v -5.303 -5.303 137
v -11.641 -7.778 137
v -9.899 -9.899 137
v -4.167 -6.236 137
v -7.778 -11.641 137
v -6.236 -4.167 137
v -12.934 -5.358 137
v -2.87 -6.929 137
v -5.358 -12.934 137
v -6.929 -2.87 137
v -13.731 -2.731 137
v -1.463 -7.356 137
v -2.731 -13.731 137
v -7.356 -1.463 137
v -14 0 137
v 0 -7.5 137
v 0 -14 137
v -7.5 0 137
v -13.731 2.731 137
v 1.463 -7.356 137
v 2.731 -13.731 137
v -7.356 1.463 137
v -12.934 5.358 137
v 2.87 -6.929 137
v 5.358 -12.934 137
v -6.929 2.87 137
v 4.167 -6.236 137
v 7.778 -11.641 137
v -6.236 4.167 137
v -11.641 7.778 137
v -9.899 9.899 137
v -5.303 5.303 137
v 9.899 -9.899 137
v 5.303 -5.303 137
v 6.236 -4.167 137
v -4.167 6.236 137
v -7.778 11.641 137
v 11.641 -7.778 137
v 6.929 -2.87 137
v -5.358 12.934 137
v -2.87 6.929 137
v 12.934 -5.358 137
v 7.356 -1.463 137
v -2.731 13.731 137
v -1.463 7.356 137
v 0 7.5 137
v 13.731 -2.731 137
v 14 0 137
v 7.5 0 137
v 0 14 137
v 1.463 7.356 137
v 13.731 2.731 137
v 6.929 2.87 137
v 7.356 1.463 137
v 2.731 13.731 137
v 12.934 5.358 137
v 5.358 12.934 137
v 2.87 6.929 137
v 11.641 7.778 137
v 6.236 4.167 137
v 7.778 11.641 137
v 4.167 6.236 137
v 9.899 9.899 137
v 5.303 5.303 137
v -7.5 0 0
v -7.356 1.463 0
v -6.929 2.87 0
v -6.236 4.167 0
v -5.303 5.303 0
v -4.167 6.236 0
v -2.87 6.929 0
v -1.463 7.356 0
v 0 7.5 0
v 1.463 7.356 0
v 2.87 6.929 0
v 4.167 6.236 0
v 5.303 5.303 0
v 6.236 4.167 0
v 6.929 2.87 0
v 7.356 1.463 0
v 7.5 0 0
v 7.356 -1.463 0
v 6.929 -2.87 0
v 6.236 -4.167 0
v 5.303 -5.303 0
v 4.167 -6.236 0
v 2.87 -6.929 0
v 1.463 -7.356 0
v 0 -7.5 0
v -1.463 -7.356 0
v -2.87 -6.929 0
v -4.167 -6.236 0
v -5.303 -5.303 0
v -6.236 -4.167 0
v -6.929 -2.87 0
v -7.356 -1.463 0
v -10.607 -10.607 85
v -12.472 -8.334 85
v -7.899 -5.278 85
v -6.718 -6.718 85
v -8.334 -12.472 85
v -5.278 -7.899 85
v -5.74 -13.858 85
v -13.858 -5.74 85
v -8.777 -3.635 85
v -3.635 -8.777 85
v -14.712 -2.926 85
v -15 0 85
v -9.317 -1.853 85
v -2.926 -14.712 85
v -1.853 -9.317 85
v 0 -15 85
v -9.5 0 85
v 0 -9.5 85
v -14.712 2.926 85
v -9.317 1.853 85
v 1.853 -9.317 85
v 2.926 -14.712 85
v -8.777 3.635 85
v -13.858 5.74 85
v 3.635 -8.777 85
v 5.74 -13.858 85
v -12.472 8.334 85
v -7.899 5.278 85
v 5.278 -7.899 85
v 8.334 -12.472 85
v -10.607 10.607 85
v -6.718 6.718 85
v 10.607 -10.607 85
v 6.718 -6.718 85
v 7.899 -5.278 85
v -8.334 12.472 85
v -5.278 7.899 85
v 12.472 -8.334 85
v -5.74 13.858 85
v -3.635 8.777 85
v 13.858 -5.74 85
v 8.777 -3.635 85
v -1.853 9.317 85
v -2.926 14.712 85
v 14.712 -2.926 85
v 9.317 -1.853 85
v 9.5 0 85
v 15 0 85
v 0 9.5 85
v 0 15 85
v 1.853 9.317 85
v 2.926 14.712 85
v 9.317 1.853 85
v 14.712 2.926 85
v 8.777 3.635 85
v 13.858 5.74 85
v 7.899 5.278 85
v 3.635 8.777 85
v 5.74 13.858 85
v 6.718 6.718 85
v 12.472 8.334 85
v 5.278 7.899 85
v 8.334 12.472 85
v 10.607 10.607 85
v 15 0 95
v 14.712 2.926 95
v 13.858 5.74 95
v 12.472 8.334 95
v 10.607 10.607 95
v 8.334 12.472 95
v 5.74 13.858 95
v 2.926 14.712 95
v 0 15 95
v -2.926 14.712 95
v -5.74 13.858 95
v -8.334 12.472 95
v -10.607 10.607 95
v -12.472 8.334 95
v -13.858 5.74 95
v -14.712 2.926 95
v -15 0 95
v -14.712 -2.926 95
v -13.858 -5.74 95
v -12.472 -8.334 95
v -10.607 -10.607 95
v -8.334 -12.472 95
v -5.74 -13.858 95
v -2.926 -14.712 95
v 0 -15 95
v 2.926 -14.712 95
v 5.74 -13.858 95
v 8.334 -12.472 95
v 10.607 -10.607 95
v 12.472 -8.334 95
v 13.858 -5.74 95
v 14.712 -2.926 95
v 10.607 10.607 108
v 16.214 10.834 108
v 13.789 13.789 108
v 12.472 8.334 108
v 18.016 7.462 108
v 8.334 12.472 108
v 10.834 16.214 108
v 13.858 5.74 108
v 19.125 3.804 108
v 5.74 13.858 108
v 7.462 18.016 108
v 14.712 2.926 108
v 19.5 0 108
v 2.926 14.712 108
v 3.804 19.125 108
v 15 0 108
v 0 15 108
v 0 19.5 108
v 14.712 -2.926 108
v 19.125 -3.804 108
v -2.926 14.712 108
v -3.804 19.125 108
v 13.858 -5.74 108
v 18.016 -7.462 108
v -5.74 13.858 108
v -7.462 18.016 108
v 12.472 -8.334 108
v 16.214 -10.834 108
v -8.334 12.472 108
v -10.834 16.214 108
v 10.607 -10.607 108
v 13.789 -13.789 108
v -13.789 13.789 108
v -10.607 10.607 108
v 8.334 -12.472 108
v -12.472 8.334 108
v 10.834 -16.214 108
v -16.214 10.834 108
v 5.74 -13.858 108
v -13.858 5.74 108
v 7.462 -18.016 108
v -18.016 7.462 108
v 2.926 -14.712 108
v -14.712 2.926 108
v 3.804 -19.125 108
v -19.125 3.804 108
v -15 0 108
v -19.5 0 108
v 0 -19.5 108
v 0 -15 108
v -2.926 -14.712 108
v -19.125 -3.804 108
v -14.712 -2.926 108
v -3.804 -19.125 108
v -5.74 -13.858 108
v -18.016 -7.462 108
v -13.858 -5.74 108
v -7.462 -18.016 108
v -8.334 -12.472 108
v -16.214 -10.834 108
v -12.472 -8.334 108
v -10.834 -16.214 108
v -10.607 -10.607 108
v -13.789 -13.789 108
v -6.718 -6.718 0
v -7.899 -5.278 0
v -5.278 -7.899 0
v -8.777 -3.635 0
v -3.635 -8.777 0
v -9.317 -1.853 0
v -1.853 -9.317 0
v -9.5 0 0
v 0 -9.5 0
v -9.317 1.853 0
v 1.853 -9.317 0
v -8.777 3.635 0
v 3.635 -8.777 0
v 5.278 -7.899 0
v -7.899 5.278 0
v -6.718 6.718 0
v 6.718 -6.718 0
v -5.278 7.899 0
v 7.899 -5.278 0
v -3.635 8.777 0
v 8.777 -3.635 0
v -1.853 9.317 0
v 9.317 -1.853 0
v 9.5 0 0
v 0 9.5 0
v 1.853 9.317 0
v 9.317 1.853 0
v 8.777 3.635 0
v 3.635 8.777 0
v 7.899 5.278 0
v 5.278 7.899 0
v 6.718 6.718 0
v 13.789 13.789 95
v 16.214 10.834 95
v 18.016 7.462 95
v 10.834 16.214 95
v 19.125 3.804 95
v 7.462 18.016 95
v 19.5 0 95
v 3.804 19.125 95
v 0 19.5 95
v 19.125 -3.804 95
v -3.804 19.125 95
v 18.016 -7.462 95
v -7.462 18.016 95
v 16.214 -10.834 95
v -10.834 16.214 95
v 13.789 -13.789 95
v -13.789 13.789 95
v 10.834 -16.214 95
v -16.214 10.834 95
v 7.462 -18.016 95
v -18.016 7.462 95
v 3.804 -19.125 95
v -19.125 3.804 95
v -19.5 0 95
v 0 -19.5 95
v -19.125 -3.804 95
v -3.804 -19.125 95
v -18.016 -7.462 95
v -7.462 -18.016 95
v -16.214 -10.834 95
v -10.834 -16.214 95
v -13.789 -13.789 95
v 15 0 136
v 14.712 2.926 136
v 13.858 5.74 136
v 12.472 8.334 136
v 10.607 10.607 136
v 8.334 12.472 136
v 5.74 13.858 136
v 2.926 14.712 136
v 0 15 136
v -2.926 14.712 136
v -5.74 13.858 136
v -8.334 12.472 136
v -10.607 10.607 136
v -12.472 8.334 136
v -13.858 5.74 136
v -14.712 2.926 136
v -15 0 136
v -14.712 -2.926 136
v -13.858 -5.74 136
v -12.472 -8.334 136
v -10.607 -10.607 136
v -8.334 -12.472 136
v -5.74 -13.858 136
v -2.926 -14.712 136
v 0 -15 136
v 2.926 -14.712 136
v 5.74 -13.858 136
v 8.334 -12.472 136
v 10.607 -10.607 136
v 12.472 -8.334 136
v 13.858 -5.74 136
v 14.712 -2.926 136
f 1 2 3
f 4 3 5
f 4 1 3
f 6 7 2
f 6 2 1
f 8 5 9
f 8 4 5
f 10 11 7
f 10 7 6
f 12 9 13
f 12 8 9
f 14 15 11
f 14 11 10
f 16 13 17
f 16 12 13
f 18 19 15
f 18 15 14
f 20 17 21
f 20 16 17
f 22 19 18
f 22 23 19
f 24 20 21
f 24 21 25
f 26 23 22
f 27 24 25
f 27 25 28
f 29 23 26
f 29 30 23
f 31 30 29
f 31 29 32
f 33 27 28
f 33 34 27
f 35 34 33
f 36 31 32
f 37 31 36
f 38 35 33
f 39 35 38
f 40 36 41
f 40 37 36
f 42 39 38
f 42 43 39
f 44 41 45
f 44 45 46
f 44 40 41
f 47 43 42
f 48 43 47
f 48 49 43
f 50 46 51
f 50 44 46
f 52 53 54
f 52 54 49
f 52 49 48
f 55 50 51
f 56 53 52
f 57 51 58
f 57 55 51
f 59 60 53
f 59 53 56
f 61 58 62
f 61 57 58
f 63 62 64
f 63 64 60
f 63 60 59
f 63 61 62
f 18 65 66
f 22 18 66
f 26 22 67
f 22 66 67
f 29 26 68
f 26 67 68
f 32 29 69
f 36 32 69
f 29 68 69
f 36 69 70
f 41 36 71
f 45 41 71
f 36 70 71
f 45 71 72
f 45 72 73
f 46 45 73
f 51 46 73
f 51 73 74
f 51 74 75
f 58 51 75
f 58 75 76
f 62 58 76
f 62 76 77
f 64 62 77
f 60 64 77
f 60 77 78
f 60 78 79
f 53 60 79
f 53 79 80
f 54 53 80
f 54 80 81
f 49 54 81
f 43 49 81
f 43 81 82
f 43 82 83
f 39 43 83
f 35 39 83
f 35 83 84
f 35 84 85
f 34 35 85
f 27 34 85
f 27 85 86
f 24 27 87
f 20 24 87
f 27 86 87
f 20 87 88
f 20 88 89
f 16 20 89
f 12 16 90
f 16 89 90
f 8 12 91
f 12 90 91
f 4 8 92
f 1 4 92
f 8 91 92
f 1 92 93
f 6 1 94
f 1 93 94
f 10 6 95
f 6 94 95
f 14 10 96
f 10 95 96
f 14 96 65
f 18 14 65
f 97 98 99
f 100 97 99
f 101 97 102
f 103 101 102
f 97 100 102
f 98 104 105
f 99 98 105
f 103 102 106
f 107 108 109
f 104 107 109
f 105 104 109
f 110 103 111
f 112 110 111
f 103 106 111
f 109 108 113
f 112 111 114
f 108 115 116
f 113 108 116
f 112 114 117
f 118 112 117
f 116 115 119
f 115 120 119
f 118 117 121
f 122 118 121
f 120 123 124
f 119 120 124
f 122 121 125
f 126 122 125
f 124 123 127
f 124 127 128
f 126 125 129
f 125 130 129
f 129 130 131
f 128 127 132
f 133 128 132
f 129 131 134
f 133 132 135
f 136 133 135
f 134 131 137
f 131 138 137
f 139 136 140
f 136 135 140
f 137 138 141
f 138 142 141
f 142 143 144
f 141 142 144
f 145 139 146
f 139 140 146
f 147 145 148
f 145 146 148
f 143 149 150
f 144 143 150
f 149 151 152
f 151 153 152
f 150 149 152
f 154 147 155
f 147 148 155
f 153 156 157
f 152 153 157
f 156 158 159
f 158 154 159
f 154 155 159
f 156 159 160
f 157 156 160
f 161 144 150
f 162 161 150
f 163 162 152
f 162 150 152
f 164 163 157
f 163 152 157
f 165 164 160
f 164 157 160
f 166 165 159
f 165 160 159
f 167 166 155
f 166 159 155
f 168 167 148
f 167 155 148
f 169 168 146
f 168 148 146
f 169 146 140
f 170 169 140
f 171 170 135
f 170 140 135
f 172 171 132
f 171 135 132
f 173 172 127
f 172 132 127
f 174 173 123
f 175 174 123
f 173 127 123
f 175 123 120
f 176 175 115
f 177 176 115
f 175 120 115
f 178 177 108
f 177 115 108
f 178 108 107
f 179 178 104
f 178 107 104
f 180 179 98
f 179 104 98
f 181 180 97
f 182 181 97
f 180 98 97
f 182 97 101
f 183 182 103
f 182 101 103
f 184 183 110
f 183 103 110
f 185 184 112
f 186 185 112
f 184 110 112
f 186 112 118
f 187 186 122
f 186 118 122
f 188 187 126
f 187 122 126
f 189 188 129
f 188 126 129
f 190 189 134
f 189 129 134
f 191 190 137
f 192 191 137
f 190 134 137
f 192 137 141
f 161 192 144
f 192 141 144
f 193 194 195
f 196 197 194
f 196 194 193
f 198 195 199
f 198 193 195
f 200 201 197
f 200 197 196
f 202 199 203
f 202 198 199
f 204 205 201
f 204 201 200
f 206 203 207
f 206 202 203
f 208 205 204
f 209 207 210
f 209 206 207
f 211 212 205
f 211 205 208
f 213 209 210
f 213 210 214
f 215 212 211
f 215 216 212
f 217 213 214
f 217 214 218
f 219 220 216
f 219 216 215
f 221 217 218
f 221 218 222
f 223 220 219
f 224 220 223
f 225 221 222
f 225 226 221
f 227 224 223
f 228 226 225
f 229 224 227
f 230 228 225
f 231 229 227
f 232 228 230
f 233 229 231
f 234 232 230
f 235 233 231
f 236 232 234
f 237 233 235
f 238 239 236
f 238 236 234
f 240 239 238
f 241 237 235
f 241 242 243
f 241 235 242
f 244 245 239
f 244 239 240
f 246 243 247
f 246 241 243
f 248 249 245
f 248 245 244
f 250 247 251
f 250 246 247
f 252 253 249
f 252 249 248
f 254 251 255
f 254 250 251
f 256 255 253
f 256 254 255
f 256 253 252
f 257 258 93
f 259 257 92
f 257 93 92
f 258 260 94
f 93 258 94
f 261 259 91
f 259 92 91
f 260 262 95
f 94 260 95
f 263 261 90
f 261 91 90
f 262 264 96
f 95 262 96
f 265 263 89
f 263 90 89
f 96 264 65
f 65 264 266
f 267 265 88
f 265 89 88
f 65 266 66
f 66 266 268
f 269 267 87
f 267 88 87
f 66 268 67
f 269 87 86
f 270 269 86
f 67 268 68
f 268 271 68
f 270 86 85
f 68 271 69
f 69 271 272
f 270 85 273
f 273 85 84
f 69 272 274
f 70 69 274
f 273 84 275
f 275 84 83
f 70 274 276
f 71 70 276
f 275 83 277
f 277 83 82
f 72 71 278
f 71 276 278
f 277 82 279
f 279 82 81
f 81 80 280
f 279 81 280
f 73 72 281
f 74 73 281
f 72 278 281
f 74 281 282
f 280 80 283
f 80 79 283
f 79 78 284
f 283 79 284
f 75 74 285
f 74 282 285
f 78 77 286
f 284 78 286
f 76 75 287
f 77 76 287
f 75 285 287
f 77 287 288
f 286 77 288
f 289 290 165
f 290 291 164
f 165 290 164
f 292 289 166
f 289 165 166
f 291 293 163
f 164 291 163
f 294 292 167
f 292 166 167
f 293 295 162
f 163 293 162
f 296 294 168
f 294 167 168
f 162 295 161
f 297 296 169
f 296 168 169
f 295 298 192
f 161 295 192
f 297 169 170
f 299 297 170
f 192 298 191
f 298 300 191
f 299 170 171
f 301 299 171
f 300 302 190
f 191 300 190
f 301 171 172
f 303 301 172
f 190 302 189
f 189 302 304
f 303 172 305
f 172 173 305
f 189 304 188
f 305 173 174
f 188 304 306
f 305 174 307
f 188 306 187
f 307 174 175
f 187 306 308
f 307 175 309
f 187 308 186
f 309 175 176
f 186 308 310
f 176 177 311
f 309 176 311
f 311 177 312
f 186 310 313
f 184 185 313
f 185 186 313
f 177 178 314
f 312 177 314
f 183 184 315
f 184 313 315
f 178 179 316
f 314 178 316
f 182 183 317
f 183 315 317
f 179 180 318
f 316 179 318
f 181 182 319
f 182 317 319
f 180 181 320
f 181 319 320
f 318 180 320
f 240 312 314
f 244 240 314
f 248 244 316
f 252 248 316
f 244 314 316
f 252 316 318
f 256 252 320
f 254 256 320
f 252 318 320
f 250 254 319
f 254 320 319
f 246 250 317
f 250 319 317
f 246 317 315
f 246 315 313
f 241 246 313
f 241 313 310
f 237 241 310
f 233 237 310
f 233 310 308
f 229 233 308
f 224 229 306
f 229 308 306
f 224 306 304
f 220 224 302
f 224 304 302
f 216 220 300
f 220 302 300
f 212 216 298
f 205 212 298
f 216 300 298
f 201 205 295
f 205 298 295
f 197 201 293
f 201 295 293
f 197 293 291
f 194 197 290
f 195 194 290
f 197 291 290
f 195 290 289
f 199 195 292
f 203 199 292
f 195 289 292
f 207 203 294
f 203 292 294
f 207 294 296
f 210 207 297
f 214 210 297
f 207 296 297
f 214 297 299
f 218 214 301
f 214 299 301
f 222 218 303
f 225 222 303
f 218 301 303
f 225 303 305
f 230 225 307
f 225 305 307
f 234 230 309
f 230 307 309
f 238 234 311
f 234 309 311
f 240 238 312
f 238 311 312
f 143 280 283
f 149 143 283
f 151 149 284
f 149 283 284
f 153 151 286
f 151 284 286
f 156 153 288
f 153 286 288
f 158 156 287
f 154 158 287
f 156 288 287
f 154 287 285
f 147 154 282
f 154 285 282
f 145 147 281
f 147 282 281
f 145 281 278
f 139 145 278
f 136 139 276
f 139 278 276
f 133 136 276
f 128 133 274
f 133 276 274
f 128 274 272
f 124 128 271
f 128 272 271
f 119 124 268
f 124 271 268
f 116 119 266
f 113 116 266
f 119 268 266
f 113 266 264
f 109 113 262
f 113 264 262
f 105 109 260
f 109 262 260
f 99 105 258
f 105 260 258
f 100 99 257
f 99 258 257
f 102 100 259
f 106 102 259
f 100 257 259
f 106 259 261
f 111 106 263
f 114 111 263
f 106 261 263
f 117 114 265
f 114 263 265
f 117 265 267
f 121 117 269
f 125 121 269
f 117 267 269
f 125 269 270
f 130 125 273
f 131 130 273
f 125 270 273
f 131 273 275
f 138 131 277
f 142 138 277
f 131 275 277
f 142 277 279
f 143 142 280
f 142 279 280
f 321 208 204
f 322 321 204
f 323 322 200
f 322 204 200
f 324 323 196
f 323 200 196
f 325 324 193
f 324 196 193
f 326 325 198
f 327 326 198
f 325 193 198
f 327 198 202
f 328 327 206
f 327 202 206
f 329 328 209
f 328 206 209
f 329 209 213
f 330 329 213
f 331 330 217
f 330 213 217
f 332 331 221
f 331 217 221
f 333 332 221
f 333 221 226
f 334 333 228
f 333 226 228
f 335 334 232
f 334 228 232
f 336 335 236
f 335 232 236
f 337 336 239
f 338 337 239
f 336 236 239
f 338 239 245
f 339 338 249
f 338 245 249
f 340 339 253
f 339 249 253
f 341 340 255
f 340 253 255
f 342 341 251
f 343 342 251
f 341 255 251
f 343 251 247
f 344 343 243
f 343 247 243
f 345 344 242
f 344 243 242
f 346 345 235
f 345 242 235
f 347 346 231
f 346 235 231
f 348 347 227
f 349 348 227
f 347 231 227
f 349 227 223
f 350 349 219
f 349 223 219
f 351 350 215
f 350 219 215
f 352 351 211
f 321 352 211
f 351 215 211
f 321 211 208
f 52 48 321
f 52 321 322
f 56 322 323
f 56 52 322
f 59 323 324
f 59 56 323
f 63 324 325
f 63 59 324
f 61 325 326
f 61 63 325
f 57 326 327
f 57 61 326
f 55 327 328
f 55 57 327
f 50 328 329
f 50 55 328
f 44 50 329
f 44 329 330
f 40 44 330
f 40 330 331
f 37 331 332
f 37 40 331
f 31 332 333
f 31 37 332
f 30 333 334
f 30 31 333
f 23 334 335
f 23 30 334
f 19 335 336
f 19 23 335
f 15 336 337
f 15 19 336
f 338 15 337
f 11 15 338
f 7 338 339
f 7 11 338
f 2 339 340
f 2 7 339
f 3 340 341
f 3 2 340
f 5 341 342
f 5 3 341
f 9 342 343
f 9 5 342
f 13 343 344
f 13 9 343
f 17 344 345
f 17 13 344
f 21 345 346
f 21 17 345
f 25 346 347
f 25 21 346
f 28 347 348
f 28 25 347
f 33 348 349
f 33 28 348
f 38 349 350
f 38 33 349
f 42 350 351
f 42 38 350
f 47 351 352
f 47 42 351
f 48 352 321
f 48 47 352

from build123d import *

# Parameters (mm, degrees)
SKETCH_1_R          = 9.5
EXTRUDE_1_DEPTH     = 85
SKETCH_2_R          = 15
EXTRUDE_2_DEPTH     = 10
SKETCH_3_R          = 19.5
EXTRUDE_3_DEPTH     = 13
SKETCH_4_R          = 15
EXTRUDE_4_DEPTH     = 29
CHAMFER_1_SIZE      = 1
SKETCH_5_R          = 7.5
CUT_EXTRUDE_1_DEPTH = 140.747987463


with BuildPart() as part:
    # Эскиз1 → Бобышка-Вытянуть1 (new body)
    with BuildSketch(Plane.XY):
        Circle(SKETCH_1_R)
    extrude(amount=EXTRUDE_1_DEPTH)

    # Эскиз2 → Бобышка-Вытянуть2 (add)
    with BuildSketch(Plane.XY.offset(85)):
        Circle(SKETCH_2_R)
    extrude(amount=EXTRUDE_2_DEPTH)

    # Эскиз3 → Бобышка-Вытянуть3 (add)
    with BuildSketch(Plane.XY.offset(95)):
        with Locations(Location((0, 0, 0), (0, 0, 180))):
            Circle(SKETCH_3_R)
    extrude(amount=EXTRUDE_3_DEPTH)

    # Эскиз4 → Бобышка-Вытянуть4 (add)
    with BuildSketch(Plane.XY.offset(108)):
        Circle(SKETCH_4_R)
    extrude(amount=EXTRUDE_4_DEPTH)

    # Фаска1
    chamfer_1_edges = [part.edges().sort_by_distance(p)[0] for p in [
        (-15, 0, 137),
    ]]
    chamfer(chamfer_1_edges, length=CHAMFER_1_SIZE)

    # Эскиз5 → Вырез-Вытянуть1 (cut, through all)
    with BuildSketch(Plane(origin=(0, 0, 0), x_dir=(-1, 0, 0), z_dir=(0, 0, -1))):
        Circle(SKETCH_5_R)
    extrude(amount=-CUT_EXTRUDE_1_DEPTH, mode=Mode.SUBTRACT)


solid = part.part
